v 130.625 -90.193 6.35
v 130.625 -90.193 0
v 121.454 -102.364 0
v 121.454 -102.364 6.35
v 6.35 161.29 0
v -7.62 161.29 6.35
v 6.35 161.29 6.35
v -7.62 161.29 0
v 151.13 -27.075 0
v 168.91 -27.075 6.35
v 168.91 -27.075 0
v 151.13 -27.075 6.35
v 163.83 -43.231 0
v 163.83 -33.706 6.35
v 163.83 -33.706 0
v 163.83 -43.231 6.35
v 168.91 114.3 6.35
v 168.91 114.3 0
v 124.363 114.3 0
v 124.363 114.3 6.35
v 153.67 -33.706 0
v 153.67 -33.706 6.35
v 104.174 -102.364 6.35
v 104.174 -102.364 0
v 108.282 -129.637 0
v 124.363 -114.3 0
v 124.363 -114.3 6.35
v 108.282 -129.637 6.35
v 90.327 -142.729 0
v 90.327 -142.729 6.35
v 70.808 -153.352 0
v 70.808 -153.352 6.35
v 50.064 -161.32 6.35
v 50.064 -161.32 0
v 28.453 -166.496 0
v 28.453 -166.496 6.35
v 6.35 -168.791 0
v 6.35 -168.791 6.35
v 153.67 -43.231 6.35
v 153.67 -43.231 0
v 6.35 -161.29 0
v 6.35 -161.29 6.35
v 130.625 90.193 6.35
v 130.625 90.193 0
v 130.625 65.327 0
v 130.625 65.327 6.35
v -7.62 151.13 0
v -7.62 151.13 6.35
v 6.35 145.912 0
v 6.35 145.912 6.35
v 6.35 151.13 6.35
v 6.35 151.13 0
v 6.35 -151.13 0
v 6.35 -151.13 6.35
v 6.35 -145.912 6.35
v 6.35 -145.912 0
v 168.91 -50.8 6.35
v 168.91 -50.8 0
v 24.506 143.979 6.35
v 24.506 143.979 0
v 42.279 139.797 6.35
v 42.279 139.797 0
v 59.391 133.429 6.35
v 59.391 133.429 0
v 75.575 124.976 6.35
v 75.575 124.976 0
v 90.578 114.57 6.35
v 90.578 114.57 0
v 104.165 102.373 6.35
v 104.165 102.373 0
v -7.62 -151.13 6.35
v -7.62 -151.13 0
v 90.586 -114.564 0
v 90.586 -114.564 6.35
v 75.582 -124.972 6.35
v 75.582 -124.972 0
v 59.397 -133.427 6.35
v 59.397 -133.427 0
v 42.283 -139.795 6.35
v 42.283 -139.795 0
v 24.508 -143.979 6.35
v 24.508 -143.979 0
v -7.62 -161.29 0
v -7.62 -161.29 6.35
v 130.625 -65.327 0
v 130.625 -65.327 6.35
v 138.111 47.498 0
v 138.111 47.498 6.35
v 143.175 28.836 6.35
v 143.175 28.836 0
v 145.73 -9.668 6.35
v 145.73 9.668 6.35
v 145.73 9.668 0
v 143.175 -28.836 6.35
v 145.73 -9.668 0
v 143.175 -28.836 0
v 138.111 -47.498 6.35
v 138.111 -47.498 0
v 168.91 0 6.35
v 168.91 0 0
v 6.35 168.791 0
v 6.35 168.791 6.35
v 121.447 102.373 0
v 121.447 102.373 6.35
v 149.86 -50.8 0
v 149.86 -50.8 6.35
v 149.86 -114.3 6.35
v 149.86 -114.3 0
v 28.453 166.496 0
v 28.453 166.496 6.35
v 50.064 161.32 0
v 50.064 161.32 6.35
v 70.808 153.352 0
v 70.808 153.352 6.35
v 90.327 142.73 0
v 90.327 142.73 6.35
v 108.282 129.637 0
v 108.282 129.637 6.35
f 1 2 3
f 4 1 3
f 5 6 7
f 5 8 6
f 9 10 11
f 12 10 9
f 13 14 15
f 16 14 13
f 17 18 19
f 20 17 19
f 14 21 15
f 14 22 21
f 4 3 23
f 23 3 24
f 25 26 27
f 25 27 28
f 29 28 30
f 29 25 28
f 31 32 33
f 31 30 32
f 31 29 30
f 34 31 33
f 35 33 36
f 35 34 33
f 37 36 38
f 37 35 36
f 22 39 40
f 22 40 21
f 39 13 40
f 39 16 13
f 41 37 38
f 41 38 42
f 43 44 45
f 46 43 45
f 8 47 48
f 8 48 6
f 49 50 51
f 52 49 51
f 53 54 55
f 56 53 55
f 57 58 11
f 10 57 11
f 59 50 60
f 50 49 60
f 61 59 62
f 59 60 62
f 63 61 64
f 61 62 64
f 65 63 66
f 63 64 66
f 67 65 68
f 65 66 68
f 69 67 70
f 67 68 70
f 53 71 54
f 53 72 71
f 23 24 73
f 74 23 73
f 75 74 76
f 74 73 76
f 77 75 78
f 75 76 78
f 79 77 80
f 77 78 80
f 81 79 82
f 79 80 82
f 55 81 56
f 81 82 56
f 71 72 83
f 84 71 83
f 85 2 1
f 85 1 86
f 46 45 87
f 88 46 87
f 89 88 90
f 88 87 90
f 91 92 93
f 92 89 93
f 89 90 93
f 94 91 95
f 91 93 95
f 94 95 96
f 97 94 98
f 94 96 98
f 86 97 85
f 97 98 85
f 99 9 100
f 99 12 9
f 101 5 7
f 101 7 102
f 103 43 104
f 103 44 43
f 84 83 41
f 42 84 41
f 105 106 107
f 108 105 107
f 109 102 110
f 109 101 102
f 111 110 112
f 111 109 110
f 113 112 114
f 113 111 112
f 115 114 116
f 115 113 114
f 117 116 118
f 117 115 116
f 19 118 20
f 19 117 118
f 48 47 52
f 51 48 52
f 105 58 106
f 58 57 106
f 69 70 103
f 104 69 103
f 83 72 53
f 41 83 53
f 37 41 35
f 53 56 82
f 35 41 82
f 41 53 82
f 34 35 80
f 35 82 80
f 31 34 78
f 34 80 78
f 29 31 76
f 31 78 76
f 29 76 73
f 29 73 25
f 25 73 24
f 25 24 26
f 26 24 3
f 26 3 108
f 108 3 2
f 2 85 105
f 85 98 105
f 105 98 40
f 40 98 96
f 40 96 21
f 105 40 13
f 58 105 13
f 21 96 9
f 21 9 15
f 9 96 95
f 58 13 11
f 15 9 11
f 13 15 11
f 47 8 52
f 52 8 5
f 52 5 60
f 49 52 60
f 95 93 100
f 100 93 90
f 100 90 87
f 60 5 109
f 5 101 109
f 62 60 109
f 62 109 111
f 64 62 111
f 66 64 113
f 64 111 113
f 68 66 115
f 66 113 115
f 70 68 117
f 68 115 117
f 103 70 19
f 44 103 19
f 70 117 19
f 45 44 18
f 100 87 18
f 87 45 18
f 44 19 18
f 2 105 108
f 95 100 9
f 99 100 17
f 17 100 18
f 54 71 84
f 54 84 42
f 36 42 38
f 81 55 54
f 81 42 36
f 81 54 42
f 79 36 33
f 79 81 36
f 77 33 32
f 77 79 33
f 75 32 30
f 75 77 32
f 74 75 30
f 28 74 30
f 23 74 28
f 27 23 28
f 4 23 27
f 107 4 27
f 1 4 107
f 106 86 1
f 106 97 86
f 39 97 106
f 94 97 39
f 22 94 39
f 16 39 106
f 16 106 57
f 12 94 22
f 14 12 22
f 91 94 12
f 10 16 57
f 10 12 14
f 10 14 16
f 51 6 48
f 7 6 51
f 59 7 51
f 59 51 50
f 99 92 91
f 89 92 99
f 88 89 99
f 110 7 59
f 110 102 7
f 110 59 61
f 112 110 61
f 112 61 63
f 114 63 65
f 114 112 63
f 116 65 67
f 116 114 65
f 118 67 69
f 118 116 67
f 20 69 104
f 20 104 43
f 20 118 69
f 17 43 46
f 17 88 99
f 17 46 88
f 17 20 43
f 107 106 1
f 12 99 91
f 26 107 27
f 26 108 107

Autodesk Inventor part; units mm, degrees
ref_plane "YZ Plane" through (0, 0, 0) normal (1, 0, 0) x (0, 1, 0)
ref_plane "XZ Plane" through (0, 0, 0) normal (0, 1, 0) x (-1, 0, 0)
ref_plane "XY Plane" through (0, 0, 0) normal (0, 0, 1) x (1, 0, 0)
sketch "Sketch1" plane through (0, 0, 0) normal (0, 0, 1) x (1, 0, 0)
  arc A0 (6.35, -145.9119) -> (0, 146.05) centre (0, 0) ccw
  line L0 (0, 0) -> (0, 323.4187) construction
  line L1 (0, 0) -> (0, -168.91) construction
  line L2 (6.35, -168.7906) -> (6.35, -145.9119)
  line L3 (6.35, 145.9119) -> (6.35, 168.7906)
  line L4 (0, -146.05) -> (0, -151.13)
  line L5 (0, -151.13) -> (6.35, -151.13)
  line L6 (6.35, -151.13) -> (-7.62, -151.13)
  line L7 (-7.62, -151.13) -> (-7.62, -161.29)
  line L8 (-7.62, -161.29) -> (6.35, -161.29)
  line L9 (0, 146.05) -> (0, 151.13)
  line L10 (0, 151.13) -> (6.35, 151.13)
  line L11 (6.35, 151.13) -> (-7.62, 151.13)
  line L12 (-7.62, 151.13) -> (-7.62, 161.29)
  line L13 (-7.62, 161.29) -> (6.35, 161.29)
  line L14 (168.91, 0) -> (168.91, -114.3)
  line L15 (168.91, -114.3) -> (124.3628, -114.3)
  arc A1 (124.3628, 114.3) -> (6.35, 168.7906) centre (0, 0) ccw
  arc A2 (6.35, -168.7906) -> (124.3628, -114.3) centre (0, 0) ccw
  line L16 (0, 0) -> (-12.7, 0)
  line L17 (-12.7, 0) -> (324.8812, 0) construction
  line L18 (168.91, 0) -> (168.91, 114.3)
  line L19 (168.91, 114.3) -> (124.3628, 114.3)
  line L20 (146.05, 0) -> (146.05, 82.55) construction
  line L21 (146.05, 82.55) -> (120.4828, 82.55) construction
  line L22 (146.05, 0) -> (146.05, -82.55) construction
  line L23 (146.05, -82.55) -> (120.4828, -82.55) construction
  line L24 (146.05, -82.55) -> (120.4828, -82.55) construction
  line L25 (130.6254, -90.1931) -> (121.4538, -102.3643)
  line L26 (121.4538, -102.3643) -> (104.1737, -102.3643)
  line L27 (130.6254, 90.1931) -> (121.447, 102.3733)
  line L28 (104.1648, 102.3733) -> (121.447, 102.3733)
  line L29 (130.6254, 90.1931) -> (130.6254, 65.3268)
  line L30 (130.6254, -90.1931) -> (130.6254, -65.3268)
  dimension "d0" = 292.1
  dimension "d7" = 6.35
  dimension "d8" = 6.35
  dimension "d9" = 5.08
  dimension "d10" = 13.97
  dimension "d11" = 10.16
  dimension "d12" = 5.08
  dimension "d13" = 13.97
  dimension "d14" = 10.16
  dimension "d16" = 5.2181
  dimension "d35" = 12.7
  dimension "d38" = 114.3
  dimension "d57" = 114.3
  dimension "d58" = 82.55
  dimension "d59" = 82.55
  dimension "d60" = 12.7
  dimension "d63" = 12.7
  dimension "d66" = 127
extrude "Extrusion2" add sketch "Sketch1" along normal blind 6.35 contours A0 L26 L25 L30 L29 L27 L28 L3 A1 L19 L18 L14 L15 A2 L2 | L2 L8 L7 L6 L5 | L10 L11 L12 L13 L3
sketch "Sketch3" plane through (0, 0, 6.35) normal (0, 0, 1) x (1, 0, 0)
  line L0 (124.3628, -114.3) -> (168.91, -114.3) projected
  line L1 (168.91, -114.3) -> (168.91, 114.3) projected
  line L2 (168.91, -114.3) -> (168.91, -43.2308) construction
  line L3 (168.91, -43.2308) -> (163.83, -43.2308) construction
  line L4 (163.83, -43.2308) -> (153.67, -43.2308)
  line L5 (153.67, -43.2308) -> (153.67, -33.7058)
  line L6 (153.67, -33.7058) -> (163.83, -33.7058)
  line L7 (163.83, -33.7058) -> (163.83, -43.2308)
  line L8 (168.91, -50.8) -> (149.86, -50.8)
  line L9 (149.86, -50.8) -> (149.86, -76.2)
  line L10 (149.86, -76.2) -> (149.86, -114.3)
  line L11 (149.86, -114.3) -> (168.91, -114.3)
  line L12 (168.91, -50.8) -> (168.91, -114.3)
  line L13 (168.91, -27.0751) -> (151.13, -27.0751)
  line L14 (151.13, -27.0751) -> (168.91, 0)
  line L15 (168.91, 0) -> (168.91, -27.0751)
  dimension "d46" = 71.0692
  dimension "d47" = 5.08
  dimension "d48" = 10.16
  dimension "d49" = 9.525
  dimension "d50" = 10.16
  dimension "d51" = 19.05
  dimension "d52" = 63.5
  dimension "d53" = 25.4
  dimension "d54" = 17.78
extrude "Extrusion5" cut sketch "Sketch3" against normal blind 25.4
properties part number "BottomHoop_v1" material "Polycarbonate, Clear"
